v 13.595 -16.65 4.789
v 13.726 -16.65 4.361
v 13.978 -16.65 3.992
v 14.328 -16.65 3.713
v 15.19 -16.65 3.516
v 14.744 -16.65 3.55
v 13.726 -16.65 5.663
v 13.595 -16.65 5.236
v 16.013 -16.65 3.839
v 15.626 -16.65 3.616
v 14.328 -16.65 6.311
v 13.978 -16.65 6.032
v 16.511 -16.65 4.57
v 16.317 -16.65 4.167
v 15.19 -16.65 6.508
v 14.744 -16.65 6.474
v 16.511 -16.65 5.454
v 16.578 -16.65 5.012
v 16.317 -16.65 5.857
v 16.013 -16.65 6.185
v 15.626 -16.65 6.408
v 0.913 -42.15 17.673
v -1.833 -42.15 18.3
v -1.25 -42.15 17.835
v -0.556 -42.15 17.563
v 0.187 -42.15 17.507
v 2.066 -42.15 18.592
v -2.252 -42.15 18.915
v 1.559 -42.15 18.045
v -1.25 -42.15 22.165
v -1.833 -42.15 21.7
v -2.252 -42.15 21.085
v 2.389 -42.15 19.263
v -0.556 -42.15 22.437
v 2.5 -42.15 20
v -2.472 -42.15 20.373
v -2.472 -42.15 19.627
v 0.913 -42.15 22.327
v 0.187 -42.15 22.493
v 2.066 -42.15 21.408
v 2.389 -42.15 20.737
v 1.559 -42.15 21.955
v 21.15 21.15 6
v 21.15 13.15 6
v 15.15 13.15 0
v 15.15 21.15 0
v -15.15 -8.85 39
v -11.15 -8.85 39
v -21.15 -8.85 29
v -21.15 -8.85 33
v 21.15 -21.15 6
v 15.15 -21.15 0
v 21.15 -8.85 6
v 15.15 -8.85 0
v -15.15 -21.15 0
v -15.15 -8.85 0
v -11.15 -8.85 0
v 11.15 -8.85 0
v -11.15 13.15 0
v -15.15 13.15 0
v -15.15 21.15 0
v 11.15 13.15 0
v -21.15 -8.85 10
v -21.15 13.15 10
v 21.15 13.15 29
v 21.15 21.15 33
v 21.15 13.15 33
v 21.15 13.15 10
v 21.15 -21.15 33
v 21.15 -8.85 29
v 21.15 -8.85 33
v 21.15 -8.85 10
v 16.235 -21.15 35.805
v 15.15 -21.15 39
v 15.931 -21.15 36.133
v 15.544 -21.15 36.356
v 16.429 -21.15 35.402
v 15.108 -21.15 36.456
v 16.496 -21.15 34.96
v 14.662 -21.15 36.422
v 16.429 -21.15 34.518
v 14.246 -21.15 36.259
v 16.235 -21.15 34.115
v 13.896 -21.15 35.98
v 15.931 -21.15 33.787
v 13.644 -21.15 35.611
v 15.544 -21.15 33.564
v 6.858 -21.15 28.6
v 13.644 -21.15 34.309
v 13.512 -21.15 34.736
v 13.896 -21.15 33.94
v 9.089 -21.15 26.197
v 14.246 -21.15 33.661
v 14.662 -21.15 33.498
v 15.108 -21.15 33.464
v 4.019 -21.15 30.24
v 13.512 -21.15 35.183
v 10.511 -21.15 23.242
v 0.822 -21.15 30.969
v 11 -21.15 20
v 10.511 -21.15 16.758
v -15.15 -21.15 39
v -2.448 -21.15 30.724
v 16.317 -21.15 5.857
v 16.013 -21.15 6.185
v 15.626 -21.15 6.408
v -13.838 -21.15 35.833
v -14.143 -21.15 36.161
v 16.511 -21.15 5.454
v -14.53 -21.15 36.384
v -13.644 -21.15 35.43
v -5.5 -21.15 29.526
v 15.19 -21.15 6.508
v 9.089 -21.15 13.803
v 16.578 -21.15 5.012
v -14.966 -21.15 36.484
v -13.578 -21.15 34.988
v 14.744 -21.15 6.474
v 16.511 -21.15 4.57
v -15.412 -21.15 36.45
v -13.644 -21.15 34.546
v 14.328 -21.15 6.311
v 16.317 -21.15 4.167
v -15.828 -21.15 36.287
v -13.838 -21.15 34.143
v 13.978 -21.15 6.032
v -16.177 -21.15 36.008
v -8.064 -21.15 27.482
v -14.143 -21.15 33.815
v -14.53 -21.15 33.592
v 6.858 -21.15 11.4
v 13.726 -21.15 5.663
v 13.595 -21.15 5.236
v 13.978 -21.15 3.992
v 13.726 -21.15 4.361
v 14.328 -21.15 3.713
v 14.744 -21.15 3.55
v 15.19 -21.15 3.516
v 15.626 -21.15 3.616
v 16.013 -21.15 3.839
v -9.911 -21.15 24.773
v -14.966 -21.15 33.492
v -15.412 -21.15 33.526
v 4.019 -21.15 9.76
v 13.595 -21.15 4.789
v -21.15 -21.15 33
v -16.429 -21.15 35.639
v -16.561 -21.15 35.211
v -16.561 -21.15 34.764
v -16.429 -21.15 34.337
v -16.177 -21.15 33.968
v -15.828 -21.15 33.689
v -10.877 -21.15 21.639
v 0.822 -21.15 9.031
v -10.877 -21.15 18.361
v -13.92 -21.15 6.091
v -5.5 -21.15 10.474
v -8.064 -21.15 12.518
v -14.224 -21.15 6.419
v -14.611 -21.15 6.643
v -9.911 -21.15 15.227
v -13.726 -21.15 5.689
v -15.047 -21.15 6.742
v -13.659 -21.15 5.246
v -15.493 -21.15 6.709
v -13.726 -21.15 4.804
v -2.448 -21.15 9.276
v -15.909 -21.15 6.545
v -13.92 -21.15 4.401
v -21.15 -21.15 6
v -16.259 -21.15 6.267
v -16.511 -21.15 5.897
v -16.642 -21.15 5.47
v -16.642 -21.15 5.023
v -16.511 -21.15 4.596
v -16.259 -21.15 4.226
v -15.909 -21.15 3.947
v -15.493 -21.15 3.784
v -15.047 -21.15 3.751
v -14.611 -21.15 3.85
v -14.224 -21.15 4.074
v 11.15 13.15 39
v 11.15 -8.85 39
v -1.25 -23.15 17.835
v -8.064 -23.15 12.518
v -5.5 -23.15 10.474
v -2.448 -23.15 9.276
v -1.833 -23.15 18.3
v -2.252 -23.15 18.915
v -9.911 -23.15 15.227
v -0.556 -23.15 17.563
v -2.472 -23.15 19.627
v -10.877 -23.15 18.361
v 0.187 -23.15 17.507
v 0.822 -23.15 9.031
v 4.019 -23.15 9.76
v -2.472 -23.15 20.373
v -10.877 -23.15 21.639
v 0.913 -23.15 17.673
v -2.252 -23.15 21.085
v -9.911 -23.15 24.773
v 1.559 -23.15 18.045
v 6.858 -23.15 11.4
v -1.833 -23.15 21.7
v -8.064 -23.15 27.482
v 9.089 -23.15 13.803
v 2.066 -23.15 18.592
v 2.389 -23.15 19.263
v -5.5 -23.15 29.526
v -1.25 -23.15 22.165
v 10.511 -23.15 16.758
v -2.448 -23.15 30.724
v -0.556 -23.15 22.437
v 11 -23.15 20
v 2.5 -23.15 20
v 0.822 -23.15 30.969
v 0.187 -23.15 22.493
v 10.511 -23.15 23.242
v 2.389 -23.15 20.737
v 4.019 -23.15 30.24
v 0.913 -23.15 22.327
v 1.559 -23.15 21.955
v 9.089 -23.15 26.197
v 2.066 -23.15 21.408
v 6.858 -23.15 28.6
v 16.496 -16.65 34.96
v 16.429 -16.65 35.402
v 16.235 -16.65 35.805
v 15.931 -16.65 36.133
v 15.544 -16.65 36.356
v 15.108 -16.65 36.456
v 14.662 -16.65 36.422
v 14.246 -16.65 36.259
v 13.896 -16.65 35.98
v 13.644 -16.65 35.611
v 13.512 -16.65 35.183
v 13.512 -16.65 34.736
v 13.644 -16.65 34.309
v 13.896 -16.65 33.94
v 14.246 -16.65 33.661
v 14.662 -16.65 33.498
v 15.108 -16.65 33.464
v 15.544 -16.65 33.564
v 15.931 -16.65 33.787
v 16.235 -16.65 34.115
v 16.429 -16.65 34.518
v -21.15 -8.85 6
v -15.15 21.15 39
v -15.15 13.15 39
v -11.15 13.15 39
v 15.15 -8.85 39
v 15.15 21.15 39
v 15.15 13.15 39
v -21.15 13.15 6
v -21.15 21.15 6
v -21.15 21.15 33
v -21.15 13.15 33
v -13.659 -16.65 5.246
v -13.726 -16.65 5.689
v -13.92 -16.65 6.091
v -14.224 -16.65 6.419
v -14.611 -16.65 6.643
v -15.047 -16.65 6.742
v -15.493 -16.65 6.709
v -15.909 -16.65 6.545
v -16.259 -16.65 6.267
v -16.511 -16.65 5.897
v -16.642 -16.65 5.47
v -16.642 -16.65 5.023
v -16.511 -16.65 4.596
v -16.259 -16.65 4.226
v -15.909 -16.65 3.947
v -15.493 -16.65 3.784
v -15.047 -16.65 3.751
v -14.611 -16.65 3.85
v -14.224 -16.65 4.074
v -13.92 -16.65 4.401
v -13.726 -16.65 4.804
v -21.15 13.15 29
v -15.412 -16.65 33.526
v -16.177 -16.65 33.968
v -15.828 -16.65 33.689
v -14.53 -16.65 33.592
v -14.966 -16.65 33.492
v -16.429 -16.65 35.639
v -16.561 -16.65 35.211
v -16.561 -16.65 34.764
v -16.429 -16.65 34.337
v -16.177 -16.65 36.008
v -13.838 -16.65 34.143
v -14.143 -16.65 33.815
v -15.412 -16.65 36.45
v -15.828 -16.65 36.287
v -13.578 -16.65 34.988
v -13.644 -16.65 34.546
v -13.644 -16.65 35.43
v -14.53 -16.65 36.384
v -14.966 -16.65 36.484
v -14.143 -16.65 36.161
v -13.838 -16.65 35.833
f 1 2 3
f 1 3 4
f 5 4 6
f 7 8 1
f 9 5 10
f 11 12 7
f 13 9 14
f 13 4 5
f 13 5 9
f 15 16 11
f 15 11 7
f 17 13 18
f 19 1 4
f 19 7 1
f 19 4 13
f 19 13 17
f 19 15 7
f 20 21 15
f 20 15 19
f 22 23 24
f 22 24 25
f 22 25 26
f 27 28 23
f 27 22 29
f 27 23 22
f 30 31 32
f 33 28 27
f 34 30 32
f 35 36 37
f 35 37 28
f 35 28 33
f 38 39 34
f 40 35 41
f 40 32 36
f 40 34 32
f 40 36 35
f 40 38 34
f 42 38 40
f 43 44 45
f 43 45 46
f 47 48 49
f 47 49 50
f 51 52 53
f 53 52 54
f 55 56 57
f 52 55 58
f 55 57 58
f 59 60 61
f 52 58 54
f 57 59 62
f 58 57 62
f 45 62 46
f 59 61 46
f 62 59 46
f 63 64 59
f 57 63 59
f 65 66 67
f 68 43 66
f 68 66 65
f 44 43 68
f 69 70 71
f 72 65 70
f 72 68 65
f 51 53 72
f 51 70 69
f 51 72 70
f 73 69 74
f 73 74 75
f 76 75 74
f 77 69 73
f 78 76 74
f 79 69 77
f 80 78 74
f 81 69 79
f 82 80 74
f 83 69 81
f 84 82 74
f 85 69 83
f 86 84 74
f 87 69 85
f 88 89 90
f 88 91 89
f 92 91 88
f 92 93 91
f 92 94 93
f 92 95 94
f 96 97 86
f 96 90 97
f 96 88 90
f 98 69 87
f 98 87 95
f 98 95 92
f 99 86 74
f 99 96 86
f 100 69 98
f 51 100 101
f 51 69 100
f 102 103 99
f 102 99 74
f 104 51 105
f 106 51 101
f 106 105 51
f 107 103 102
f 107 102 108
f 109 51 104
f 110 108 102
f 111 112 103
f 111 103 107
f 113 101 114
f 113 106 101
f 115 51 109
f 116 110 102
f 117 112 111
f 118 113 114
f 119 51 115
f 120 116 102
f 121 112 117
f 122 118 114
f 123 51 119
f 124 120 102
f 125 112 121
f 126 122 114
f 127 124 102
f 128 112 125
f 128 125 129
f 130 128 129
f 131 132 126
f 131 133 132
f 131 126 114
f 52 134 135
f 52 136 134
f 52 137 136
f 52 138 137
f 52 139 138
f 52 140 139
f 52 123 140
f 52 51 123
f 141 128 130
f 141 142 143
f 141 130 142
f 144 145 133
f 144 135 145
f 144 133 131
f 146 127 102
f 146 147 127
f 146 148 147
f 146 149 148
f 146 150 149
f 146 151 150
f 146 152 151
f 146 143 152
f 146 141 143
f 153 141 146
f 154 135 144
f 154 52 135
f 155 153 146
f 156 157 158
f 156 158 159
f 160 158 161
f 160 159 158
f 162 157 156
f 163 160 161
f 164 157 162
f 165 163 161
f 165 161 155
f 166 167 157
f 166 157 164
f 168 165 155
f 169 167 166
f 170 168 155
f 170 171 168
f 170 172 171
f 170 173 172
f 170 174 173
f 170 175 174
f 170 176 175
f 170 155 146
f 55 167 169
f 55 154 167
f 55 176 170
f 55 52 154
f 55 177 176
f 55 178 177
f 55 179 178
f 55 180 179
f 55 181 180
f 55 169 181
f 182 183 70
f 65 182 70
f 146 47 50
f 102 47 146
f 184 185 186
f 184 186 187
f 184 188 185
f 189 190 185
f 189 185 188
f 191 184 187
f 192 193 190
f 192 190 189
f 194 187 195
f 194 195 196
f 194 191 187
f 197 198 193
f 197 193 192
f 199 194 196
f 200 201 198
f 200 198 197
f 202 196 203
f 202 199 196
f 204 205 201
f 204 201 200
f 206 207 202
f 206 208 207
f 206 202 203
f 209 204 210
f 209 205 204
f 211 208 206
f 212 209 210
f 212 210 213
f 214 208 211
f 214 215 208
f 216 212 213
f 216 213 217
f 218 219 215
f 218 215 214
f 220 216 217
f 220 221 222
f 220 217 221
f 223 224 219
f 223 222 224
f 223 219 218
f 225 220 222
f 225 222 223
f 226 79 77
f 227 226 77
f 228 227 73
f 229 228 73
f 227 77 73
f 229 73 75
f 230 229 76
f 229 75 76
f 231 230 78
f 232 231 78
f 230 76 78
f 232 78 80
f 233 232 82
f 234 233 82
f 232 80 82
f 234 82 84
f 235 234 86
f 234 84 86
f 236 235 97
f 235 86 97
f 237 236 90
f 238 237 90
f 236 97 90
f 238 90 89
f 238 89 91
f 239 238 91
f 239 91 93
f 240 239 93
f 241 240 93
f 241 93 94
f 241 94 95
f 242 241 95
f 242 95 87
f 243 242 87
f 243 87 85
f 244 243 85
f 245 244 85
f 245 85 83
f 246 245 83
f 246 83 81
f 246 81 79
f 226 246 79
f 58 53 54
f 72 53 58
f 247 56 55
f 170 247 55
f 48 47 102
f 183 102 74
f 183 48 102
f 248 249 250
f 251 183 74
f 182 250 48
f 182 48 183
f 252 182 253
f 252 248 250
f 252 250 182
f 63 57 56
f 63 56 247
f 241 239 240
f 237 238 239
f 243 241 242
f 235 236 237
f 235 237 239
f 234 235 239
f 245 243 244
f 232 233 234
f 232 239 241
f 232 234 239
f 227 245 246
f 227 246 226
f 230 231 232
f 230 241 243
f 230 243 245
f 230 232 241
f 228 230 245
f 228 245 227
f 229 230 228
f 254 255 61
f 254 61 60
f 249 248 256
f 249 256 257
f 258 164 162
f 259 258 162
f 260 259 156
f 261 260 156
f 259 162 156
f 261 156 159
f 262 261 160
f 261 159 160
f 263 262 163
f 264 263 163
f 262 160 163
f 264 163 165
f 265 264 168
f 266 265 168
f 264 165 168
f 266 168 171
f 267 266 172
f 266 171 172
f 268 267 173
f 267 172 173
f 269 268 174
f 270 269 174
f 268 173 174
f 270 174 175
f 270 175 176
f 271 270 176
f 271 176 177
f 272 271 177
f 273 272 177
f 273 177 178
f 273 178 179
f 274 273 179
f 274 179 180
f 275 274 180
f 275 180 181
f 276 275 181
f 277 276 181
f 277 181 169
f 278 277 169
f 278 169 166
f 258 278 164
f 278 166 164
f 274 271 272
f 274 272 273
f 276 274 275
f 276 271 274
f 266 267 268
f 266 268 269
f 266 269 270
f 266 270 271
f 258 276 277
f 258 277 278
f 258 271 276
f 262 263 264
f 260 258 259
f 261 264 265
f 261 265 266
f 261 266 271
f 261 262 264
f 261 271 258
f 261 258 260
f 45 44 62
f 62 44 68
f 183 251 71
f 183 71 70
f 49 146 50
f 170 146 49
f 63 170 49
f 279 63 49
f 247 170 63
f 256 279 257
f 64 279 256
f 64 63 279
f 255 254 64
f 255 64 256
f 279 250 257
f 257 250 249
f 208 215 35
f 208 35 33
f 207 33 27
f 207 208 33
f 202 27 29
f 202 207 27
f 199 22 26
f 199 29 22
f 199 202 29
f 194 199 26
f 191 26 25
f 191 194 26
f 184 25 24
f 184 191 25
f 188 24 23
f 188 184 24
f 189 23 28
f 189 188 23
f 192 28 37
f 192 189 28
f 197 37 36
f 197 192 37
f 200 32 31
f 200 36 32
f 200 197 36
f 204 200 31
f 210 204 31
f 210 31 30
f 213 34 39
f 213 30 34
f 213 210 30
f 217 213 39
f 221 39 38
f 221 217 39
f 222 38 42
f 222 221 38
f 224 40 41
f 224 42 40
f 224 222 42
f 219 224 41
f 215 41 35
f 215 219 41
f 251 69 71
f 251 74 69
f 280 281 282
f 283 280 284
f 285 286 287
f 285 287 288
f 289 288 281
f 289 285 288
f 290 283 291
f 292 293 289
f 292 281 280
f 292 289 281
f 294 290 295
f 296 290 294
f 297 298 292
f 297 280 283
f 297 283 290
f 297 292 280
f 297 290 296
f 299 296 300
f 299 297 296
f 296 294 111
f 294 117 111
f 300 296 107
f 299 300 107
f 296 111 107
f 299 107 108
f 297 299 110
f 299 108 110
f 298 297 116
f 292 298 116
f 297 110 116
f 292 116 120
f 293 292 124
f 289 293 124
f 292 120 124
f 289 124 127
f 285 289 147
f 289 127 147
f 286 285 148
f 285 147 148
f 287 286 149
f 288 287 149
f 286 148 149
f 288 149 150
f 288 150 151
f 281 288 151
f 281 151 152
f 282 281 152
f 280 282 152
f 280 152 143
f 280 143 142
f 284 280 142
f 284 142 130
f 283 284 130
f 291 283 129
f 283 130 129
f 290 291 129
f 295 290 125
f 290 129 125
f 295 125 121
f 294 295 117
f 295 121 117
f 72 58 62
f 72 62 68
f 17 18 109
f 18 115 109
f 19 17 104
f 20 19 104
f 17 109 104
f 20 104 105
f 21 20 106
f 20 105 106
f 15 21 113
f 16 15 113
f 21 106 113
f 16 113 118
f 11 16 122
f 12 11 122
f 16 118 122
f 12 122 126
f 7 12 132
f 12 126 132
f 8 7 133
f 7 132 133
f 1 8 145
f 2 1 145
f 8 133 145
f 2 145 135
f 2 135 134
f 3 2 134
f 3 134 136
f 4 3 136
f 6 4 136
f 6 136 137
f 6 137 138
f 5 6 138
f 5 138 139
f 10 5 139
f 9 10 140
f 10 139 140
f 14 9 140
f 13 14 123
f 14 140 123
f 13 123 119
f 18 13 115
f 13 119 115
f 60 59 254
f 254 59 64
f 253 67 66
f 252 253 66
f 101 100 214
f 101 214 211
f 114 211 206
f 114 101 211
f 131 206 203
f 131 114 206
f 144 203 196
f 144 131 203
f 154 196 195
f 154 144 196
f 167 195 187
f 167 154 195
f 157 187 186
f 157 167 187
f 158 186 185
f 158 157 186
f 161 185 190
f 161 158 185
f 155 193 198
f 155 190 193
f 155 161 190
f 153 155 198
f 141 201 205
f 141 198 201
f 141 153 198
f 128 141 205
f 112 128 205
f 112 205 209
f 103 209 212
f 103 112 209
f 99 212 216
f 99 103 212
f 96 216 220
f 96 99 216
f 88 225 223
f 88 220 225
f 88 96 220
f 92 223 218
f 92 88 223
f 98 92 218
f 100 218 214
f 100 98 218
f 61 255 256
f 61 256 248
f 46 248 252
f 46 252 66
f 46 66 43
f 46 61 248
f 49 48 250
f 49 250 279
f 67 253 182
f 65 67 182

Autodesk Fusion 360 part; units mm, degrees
sketch "Sketch1" plane through (0, 0, 0) normal (0, 0, 1) x (1, 0, 0)
  line L0 (21.15, -21.15) -> (-21.15, -21.15)
  line L1 (-21.15, -21.15) -> (-21.15, 21.15)
  line L2 (-21.15, 21.15) -> (21.15, 21.15)
  line L3 (21.15, 21.15) -> (21.15, -21.15)
  line L4 (21.15, -21.15) -> (-21.15, 21.15) construction
  line L5 (-21.15, -21.15) -> (21.15, 21.15) construction
  dimension "d3" = 42.3
  dimension "d4" = 42.3
extrude "Extrude1" add sketch "Sketch1" along normal blind 39
chamfer "Chamfer1" distance 6 angle 45 4 edges at (-21.15, 0, 39) (21.15, 0, 39) (21.15, 0, 0) (-21.15, 0, 0)
sketch "Sketch2" plane through (0, -21.15, 0) normal (0, -1, 0) x (1, 0, 0)
  line L0 (-21.15, 6) -> (-15.15, 0)
  line L1 (-15.15, 0) -> (15.15, 0)
  line L2 (15.15, 0) -> (21.15, 6)
  line L3 (21.15, 6) -> (21.15, 33)
  line L4 (21.15, 33) -> (15.15, 39)
  line L5 (15.15, 39) -> (-15.15, 39)
  line L6 (-15.15, 39) -> (-21.15, 33)
  line L7 (-21.15, 33) -> (-21.15, 6)
  circle A0 centre (0, 20) radius 2.5
  dimension "d8" = 5
extrude "Extrude2" add sketch "Sketch2" along normal blind 21 contours A0
sketch "Sketch3" plane through (0, -21.15, 0) normal (0, -1, 0) x (1, 0, 0)
  circle A0 centre (0, 20) radius 2.5
  line L0 (-21.15, 6) -> (-15.15, 0)
  line L1 (-15.15, 0) -> (15.15, 0)
  line L2 (15.15, 0) -> (21.15, 6)
  line L3 (21.15, 6) -> (21.15, 33)
  line L4 (21.15, 33) -> (15.15, 39)
  line L5 (15.15, 39) -> (-15.15, 39)
  line L6 (-15.15, 39) -> (-21.15, 33)
  line L7 (-21.15, 33) -> (-21.15, 6)
  circle A1 centre (0, 20) radius 11
  dimension "d11" = 22
extrude "Extrude3" add sketch "Sketch3" along normal blind 2 contours A1
sketch "Sketch4" plane through (0, -21.15, 0) normal (0, -1, 0) x (1, 0, 0)
  circle A0 centre (0, 20) radius 11
  line L0 (-21.15, 6) -> (-15.15, 0)
  line L1 (-15.15, 0) -> (15.15, 0)
  line L2 (15.15, 0) -> (21.15, 6)
  line L3 (21.15, 6) -> (21.15, 33)
  line L4 (21.15, 33) -> (15.15, 39)
  line L5 (15.15, 39) -> (-15.15, 39)
  line L6 (-15.15, 39) -> (-21.15, 33)
  line L7 (-21.15, 33) -> (-21.15, 6)
  circle A1 centre (-15.0778, 34.9879) radius 1.5
  circle A2 centre (15.0778, 5.0121) radius 1.5
  circle A3 centre (14.9957, 34.9599) radius 1.5
  circle A4 centre (-15.1592, 5.2464) radius 1.5
  dimension "d14" = 3
  dimension "d16" = 360
  dimension "d17" = 3
  dimension "d18" = 3
extrude "Extrude4" cut sketch "Sketch4" against normal blind 4.5 contours A1 | A2 | A3 | A4
sketch "Sketch5" plane through (0, 21.15, 0) normal (0, 1, 0) x (-1, 0, 0)
  line L0 (15.15, 0) -> (21.15, 6)
  line L1 (21.15, 6) -> (21.15, 33)
  line L2 (21.15, 33) -> (15.15, 39)
  line L3 (15.15, 39) -> (-15.15, 39)
  line L4 (-15.15, 39) -> (-21.15, 33)
  line L5 (-21.15, 33) -> (-21.15, 6)
  line L6 (-21.15, 6) -> (-15.15, 0)
  line L7 (-15.15, 0) -> (15.15, 0)
  line L8 (-11.15, 39) -> (-21.15, 29)
  line L9 (-21.15, 29) -> (-21.15, 39)
  line L10 (-11.15, 39) -> (-21.15, 39)
  dimension "d21" = 10
  dimension "d22" = 10
extrude "Extrude5" cut sketch "Sketch5" against normal blind 22 from surface at -8 contours L3 L4 L5 L8 L9 L10 | L4 L9 L10
sketch "Sketch6" plane through (0, 21.15, 0) normal (0, 1, 0) x (-1, 0, 0)
  line L0 (15.15, 0) -> (21.15, 6)
  line L1 (21.15, 6) -> (21.15, 33)
  line L2 (21.15, 33) -> (15.15, 39)
  line L3 (15.15, 39) -> (-15.15, 39)
  line L4 (-15.15, 39) -> (-21.15, 33)
  line L5 (-21.15, 33) -> (-21.15, 6)
  line L6 (-21.15, 6) -> (-15.15, 0)
  line L7 (-15.15, 0) -> (15.15, 0)
  line L8 (11.15, 39) -> (21.15, 29)
  line L9 (11.15, 39) -> (21.15, 39)
  line L10 (21.15, 29) -> (21.15, 39)
  dimension "d26" = 10
  dimension "d27" = 10
extrude "Extrude6" cut sketch "Sketch6" against normal blind 22 from surface at -8 contours L1 L2 L3 L8 L9 L10 | L2 L9 L10
sketch "Sketch7" plane through (0, 21.15, 0) normal (0, 1, 0) x (-1, 0, 0)
  line L0 (15.15, 0) -> (21.15, 6)
  line L1 (21.15, 6) -> (21.15, 33)
  line L2 (21.15, 33) -> (15.15, 39)
  line L3 (15.15, 39) -> (-15.15, 39)
  line L4 (-15.15, 39) -> (-21.15, 33)
  line L5 (-21.15, 33) -> (-21.15, 6)
  line L6 (-21.15, 6) -> (-15.15, 0)
  line L7 (-15.15, 0) -> (15.15, 0)
  line L8 (21.15, 10) -> (11.15, 0)
  line L9 (11.15, 0) -> (21.15, 0)
  line L10 (21.15, 10) -> (21.15, 0)
  dimension "d31" = 10
  dimension "d32" = 10
extrude "Extrude7" cut sketch "Sketch7" against normal blind 22 from surface at -8 contours L0 L1 L7 L8 L9 L10 | L0 L9 L10
sketch "Sketch8" plane through (0, 21.15, 0) normal (0, 1, 0) x (-1, 0, 0)
  line L0 (15.15, 0) -> (21.15, 6)
  line L1 (21.15, 6) -> (21.15, 33)
  line L2 (21.15, 33) -> (15.15, 39)
  line L3 (15.15, 39) -> (-15.15, 39)
  line L4 (-15.15, 39) -> (-21.15, 33)
  line L5 (-21.15, 33) -> (-21.15, 6)
  line L6 (-21.15, 6) -> (-15.15, 0)
  line L7 (-15.15, 0) -> (15.15, 0)
  line L8 (-11.15, 0) -> (-21.15, 10)
  line L9 (-11.15, 0) -> (-21.15, 0)
  line L10 (-21.15, 10) -> (-21.15, 0)
  dimension "d36" = 10
  dimension "d37" = 10
extrude "Extrude8" cut sketch "Sketch8" against normal blind 22 from surface at -8 contours L5 L6 L7 L8 L9 L10 | L6 L9 L10
sketch "Sketch9" plane through (0, 13.15, 0) normal (0, -1, 0) x (1, 0, 0)
  line L0 (21.15, 33) -> (15.15, 39)
  line L1 (15.15, 39) -> (11.15, 39)
  line L2 (21.15, 29) -> (21.15, 33)
sketch "Sketch10" plane through (0, 13.15, 0) normal (0, -1, 0) x (1, 0, 0)
sketch "Sketch11" plane through (0, 13.15, 0) normal (0, -1, 0) x (1, 0, 0)
sketch "Sketch12" plane through (0, 13.15, 0) normal (0, -1, 0) x (1, 0, 0)
